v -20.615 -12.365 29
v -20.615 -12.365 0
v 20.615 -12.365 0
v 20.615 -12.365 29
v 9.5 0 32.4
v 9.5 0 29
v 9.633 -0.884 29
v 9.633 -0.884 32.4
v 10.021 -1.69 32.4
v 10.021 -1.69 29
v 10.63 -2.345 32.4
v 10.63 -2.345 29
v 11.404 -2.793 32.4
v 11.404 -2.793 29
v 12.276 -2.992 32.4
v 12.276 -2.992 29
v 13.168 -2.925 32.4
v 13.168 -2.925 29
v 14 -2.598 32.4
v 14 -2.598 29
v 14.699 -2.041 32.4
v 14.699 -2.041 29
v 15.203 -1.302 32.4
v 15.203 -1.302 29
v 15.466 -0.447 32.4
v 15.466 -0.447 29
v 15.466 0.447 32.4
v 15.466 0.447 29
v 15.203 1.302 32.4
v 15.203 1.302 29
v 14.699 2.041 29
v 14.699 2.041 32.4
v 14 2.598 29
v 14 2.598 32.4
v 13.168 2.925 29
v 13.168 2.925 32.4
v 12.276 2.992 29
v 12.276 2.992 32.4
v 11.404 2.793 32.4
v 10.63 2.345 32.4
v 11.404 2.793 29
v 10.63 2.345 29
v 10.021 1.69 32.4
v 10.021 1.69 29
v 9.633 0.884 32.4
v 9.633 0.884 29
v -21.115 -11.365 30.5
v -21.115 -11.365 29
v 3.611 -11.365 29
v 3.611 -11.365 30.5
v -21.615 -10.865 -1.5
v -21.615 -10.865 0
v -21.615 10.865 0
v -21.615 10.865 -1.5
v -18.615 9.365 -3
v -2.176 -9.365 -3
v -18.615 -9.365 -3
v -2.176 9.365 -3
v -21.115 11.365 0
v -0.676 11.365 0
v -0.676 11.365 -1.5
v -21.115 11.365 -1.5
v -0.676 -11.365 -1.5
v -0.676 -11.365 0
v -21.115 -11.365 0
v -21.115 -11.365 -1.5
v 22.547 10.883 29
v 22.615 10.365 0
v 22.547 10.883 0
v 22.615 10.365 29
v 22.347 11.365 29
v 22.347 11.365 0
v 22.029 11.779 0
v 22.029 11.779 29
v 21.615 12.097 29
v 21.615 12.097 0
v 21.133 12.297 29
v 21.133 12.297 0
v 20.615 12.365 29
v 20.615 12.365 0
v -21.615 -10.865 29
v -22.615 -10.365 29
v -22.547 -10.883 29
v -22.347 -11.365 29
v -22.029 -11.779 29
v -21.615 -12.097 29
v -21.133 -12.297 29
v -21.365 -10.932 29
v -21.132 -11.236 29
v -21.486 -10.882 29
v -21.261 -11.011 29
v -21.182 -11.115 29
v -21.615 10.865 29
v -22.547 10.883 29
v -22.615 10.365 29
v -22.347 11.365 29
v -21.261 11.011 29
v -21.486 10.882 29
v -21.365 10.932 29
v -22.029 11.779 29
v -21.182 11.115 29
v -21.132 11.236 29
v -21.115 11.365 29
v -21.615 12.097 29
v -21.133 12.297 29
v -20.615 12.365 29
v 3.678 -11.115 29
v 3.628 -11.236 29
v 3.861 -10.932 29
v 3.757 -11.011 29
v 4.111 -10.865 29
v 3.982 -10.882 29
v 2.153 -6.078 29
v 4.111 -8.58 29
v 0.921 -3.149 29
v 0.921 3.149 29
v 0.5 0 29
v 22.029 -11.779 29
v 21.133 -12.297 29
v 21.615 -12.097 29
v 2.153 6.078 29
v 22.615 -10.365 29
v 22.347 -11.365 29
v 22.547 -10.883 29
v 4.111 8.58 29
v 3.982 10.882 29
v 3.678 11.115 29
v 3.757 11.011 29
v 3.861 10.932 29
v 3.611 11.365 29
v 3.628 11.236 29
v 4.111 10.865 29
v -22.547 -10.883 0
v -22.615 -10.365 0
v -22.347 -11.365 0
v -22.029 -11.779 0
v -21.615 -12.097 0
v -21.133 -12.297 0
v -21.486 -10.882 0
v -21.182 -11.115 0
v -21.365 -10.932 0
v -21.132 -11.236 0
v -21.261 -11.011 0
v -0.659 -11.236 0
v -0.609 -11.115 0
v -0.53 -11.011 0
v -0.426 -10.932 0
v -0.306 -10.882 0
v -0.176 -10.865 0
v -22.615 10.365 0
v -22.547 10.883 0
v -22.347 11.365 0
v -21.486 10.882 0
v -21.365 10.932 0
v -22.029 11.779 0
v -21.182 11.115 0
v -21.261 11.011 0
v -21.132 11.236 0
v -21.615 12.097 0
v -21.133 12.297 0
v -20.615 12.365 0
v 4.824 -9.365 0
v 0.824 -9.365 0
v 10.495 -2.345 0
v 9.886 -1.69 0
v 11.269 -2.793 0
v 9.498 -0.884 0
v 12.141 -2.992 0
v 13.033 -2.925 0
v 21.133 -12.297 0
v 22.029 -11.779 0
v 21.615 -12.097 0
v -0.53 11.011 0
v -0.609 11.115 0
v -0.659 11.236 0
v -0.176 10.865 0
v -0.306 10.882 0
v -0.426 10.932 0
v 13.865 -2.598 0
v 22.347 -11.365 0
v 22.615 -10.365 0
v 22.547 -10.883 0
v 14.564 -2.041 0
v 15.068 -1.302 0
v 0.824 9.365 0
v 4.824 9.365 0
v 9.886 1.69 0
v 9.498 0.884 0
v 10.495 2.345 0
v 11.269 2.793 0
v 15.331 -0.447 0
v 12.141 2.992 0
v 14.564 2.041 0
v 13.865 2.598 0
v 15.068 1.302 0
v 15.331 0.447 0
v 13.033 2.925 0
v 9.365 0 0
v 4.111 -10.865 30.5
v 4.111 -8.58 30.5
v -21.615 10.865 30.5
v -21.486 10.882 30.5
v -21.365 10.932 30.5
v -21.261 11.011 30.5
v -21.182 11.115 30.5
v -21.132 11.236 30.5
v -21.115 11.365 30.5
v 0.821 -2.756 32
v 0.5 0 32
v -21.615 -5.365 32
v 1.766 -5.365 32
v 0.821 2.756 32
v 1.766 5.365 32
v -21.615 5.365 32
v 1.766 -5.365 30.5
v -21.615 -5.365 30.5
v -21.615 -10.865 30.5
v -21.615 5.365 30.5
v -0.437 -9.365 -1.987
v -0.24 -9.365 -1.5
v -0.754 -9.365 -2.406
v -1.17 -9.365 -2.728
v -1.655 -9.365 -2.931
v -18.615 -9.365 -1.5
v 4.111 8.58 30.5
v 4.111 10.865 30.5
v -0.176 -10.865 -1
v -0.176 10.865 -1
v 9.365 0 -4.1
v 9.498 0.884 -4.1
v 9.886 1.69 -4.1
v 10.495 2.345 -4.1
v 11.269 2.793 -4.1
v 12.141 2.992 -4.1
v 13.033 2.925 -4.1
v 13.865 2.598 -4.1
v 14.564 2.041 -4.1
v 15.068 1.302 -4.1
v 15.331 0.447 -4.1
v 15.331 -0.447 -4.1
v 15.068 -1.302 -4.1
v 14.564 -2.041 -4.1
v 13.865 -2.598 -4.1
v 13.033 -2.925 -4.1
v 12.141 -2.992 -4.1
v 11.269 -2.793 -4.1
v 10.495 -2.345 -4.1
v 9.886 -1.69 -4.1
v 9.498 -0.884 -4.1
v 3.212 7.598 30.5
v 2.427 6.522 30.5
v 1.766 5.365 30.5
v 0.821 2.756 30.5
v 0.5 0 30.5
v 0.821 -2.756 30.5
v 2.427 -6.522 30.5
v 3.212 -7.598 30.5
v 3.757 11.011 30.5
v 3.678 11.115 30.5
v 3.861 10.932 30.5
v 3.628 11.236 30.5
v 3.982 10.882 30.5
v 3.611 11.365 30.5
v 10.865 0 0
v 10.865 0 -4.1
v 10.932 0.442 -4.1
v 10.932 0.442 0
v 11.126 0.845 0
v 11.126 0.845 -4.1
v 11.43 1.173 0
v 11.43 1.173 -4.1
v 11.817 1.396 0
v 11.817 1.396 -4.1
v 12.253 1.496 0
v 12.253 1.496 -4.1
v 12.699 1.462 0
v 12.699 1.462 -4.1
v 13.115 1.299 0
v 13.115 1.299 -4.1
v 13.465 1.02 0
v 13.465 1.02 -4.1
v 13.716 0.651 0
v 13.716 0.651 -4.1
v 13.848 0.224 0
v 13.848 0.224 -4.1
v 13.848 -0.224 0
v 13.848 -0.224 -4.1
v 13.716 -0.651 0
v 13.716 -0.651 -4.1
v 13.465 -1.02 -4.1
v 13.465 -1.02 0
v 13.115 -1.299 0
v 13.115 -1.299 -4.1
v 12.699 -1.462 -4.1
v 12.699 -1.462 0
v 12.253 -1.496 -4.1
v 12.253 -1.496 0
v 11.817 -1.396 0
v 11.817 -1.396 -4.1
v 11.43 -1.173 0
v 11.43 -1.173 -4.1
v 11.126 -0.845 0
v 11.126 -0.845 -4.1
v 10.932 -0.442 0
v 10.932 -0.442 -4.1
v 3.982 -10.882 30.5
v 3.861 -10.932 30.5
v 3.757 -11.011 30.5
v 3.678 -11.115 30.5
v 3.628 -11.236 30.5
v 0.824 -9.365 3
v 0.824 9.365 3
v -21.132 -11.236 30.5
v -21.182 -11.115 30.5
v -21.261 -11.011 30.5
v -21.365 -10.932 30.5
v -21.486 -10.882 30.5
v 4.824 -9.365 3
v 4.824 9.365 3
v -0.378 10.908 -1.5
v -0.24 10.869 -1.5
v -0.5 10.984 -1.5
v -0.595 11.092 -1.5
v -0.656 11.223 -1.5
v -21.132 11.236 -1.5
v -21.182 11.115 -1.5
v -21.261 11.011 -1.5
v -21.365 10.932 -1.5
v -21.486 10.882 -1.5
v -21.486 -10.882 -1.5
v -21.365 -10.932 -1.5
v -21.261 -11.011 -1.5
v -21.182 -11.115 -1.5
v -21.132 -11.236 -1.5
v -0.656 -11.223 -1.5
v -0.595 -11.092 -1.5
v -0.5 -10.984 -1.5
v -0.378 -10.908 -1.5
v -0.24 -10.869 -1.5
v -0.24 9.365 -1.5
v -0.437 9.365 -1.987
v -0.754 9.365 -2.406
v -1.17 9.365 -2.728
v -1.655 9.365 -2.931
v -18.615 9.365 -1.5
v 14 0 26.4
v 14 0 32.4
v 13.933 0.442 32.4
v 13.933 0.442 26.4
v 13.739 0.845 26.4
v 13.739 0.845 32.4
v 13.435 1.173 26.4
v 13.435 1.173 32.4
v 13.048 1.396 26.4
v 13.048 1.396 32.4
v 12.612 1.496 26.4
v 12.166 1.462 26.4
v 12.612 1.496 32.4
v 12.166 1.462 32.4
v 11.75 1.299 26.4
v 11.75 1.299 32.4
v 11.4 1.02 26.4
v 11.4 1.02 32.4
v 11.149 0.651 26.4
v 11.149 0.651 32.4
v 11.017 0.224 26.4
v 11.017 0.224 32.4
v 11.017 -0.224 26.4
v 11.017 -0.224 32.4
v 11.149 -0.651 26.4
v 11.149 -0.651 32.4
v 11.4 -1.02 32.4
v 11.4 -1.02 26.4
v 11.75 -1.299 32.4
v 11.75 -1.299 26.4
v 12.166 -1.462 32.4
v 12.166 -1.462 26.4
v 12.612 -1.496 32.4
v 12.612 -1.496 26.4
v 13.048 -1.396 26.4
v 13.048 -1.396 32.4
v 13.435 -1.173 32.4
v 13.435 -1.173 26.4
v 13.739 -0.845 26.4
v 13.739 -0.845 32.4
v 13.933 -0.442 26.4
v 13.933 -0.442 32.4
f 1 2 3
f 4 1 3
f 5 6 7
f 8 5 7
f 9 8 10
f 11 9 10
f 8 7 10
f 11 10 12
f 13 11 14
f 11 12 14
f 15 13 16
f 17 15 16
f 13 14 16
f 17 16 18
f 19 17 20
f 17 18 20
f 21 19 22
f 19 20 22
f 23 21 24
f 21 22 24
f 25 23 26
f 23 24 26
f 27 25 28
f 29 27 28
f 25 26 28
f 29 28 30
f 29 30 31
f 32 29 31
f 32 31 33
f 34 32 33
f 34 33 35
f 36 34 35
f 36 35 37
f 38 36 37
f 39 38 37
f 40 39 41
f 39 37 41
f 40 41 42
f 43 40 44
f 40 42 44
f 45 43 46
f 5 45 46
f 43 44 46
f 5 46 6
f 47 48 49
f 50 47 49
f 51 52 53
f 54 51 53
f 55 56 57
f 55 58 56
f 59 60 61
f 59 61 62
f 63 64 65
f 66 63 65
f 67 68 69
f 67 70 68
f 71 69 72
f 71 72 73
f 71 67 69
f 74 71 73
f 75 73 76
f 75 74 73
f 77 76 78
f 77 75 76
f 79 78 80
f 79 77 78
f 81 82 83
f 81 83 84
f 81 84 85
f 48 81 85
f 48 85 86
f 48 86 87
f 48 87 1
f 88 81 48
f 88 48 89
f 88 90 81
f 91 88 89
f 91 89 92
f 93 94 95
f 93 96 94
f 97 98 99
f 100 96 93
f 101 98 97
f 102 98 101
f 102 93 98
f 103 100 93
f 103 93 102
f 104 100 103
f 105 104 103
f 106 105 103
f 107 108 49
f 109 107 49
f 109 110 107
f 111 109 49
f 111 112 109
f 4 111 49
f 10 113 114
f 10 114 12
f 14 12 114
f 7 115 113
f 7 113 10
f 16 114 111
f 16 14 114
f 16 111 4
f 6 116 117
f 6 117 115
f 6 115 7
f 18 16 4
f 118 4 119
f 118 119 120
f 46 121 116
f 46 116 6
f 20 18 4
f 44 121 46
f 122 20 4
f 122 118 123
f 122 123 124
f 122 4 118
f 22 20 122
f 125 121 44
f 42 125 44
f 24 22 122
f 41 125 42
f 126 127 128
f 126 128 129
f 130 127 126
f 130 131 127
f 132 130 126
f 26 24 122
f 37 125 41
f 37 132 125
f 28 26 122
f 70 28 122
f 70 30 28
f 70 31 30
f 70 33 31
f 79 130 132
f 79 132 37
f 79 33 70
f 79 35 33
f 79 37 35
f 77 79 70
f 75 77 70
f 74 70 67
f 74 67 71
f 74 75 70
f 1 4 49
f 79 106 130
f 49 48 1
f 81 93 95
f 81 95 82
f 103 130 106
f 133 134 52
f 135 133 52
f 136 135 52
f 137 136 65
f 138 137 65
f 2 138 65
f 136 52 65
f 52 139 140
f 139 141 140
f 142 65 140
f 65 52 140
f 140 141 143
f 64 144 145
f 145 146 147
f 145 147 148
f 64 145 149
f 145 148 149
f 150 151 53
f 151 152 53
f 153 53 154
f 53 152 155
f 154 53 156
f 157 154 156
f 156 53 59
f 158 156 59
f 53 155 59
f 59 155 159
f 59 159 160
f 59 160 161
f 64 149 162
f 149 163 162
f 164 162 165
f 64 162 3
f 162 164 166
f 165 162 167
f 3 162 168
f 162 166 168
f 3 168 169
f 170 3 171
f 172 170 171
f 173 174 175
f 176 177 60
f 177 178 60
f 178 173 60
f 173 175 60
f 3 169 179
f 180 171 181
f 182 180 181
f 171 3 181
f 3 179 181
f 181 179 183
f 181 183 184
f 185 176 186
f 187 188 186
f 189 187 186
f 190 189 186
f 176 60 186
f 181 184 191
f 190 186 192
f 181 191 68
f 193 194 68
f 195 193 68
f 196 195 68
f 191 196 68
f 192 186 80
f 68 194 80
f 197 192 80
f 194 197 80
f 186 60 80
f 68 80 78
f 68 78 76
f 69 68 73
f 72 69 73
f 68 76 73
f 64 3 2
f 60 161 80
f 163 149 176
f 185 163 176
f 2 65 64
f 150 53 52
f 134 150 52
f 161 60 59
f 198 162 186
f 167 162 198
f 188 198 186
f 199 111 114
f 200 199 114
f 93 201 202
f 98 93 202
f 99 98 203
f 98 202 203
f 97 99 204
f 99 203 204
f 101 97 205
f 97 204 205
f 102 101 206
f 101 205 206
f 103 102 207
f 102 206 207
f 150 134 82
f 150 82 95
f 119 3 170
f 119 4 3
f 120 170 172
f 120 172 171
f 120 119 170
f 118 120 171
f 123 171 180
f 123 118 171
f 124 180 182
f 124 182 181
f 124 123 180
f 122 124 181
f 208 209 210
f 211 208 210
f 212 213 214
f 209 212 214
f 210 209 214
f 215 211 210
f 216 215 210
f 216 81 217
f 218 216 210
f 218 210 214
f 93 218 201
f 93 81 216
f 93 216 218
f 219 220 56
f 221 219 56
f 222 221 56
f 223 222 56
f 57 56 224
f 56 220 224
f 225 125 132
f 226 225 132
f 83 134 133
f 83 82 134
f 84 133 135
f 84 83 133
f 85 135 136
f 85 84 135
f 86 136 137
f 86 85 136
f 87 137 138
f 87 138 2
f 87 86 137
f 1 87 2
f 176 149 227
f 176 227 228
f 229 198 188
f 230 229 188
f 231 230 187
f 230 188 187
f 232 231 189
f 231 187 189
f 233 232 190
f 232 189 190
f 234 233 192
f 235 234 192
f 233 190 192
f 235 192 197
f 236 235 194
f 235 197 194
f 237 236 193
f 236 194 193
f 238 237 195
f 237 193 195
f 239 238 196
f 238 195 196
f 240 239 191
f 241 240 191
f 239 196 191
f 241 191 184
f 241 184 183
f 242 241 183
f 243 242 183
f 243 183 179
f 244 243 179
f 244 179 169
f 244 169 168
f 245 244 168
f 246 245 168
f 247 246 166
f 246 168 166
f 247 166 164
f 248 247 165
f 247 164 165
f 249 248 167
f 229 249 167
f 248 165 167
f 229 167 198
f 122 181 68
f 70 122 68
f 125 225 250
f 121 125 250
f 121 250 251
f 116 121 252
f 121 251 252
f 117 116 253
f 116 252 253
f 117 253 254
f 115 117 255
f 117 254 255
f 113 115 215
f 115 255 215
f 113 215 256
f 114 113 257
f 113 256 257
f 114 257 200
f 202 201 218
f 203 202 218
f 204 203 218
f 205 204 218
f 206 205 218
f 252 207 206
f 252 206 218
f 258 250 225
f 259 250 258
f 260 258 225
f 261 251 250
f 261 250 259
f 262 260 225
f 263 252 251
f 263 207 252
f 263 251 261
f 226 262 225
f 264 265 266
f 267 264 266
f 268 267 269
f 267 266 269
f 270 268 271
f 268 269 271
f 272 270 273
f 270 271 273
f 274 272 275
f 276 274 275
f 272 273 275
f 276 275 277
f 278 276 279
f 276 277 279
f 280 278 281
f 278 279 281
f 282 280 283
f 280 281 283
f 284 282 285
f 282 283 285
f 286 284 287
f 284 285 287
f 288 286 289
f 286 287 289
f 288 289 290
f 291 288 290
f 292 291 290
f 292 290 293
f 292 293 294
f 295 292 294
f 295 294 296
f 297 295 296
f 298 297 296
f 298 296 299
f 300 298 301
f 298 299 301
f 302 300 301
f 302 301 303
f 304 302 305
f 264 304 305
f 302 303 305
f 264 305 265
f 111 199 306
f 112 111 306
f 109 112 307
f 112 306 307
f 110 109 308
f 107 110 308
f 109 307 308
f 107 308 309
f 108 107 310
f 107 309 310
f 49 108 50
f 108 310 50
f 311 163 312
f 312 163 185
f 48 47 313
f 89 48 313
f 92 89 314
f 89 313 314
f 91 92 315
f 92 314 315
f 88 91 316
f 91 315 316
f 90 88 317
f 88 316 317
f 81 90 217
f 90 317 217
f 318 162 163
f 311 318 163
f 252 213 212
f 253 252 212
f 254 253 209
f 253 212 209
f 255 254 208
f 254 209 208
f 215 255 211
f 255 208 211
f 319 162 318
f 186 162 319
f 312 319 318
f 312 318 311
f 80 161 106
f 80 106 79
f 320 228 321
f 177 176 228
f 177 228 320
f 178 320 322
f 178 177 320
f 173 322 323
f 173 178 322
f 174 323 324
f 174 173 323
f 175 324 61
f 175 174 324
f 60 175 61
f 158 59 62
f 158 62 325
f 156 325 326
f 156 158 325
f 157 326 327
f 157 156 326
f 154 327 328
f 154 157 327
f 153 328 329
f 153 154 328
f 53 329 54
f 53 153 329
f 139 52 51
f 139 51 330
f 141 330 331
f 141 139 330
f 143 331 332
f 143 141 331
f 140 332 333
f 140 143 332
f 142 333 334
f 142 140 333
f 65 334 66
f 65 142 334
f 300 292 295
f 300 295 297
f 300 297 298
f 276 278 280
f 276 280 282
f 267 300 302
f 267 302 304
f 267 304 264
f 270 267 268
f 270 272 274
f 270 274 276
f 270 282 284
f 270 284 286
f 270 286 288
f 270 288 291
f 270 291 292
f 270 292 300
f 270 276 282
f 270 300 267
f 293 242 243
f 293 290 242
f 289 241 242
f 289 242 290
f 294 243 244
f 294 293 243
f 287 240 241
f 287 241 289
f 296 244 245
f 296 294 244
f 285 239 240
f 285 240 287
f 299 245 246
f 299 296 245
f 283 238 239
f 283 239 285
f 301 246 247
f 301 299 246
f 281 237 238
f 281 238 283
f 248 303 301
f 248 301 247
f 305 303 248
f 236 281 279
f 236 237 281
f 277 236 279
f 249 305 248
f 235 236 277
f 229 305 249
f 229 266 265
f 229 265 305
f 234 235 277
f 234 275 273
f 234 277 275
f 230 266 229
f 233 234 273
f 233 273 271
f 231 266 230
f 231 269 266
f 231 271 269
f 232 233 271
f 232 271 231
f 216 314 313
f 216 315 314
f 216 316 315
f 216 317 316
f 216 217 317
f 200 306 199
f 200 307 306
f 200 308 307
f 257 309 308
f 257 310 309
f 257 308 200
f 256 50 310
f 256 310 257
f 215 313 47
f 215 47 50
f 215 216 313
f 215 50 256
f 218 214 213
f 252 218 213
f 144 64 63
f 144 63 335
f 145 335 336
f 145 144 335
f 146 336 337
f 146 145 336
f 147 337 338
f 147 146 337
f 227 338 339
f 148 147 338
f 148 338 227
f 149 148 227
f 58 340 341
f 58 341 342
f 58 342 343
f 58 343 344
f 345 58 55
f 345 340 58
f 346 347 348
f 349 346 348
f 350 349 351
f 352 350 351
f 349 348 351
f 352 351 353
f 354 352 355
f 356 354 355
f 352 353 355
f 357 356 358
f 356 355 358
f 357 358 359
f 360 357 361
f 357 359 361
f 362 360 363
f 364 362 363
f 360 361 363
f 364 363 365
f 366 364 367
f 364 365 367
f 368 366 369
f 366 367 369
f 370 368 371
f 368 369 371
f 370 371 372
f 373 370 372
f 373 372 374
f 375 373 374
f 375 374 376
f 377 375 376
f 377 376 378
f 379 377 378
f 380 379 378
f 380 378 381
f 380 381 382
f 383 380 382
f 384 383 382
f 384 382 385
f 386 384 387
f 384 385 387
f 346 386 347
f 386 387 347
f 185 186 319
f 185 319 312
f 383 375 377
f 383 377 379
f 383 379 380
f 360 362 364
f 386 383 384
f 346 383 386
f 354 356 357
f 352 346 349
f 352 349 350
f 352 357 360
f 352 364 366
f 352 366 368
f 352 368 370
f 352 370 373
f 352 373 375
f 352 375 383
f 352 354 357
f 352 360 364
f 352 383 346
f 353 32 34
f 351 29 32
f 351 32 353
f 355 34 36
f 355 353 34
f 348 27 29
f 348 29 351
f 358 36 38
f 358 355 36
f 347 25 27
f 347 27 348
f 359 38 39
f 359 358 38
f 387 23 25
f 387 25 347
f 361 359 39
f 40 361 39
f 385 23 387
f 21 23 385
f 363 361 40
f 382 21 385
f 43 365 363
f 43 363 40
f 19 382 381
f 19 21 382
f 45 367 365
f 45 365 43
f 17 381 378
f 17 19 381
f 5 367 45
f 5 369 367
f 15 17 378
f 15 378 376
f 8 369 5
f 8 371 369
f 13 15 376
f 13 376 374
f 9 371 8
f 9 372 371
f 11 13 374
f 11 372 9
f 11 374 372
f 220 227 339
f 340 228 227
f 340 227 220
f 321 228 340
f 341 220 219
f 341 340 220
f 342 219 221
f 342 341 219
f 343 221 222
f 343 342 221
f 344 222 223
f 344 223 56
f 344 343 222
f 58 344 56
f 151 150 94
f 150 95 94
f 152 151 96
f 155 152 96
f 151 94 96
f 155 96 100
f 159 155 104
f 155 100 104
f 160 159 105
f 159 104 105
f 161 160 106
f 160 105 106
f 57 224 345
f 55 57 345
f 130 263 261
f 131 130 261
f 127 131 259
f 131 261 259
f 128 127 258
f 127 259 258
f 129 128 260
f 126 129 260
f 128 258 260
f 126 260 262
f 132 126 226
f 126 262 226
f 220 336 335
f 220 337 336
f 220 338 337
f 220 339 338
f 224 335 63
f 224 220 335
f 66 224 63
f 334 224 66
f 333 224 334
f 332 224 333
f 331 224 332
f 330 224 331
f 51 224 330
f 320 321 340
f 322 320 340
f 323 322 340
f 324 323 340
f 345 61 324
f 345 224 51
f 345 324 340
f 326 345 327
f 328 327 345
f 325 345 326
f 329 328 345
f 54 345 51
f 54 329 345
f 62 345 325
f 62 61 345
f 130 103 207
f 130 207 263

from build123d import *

# Parameters (mm, degrees)
SKETCH_1_W          = 45.23
SKETCH_1_H          = 24.73
EXTRUDE_1_DEPTH     = 29
FILLET_1_R          = 2
SKETCH_2_R          = 3
EXTRUDE_2_DEPTH     = 3.4
SKETCH_3_R          = 1.5
CUT_EXTRUDE_1_DEPTH = 6
SKETCH_4_W          = 25.725975672
SKETCH_4_H          = 22.73
EXTRUDE_3_DEPTH     = 1.5
SKETCH_5_R          = 0.5
CUT_EXTRUDE_2_DEPTH = 1.5
CUT_EXTRUDE_3_DEPTH = 1.5
EXTRUDE_START       = 1.5
EXTRUDE_4_DEPTH     = 1.5
SKETCH_21_W         = 21.4387918
SKETCH_21_H         = 22.73
EXTRUDE_11_DEPTH    = 1.5
CUT_EXTRUDE_START   = -1.5
SKETCH_23_R         = 0.5
CUT_EXTRUDE_4_DEPTH = 1.5
SKETCH_24_W         = 18.4387918
SKETCH_24_H         = 18.73
EXTRUDE_12_DEPTH    = 1.5
FILLET_2_R          = 2
SKETCH_25_R         = 3
EXTRUDE_13_DEPTH    = 4.1
SKETCH_26_R         = 1.5
CUT_EXTRUDE_5_DEPTH = 4.1
SKETCH_27_W         = 4
SKETCH_27_H         = 18.73
CUT_EXTRUDE_6_DEPTH = 3


with BuildPart() as part:
    # 草图1 → 凸台-拉伸1 (new body)
    with BuildSketch(Plane.XY):
        Rectangle(SKETCH_1_W, SKETCH_1_H)
    extrude(amount=EXTRUDE_1_DEPTH)

    # 圆角1
    fillet_1_edges = [part.edges().sort_by_distance(p)[0] for p in [
        (22.615, -12.365, 14.5),
        (-22.615, -12.365, 14.5),
        (-22.615, 12.365, 14.5),
        (22.615, 12.365, 14.5),
    ]]
    fillet(fillet_1_edges, radius=FILLET_1_R)

    # 草图2 → 凸台-拉伸2 (add)
    with BuildSketch(Plane.XY.offset(29)):
        with Locations(Location((12.5, 0, 0), (0, 0, 180))):
            Circle(SKETCH_2_R)
    extrude(amount=EXTRUDE_2_DEPTH)

    # 草图3 → 切除-拉伸1 (cut)
    with BuildSketch(Plane.XY.offset(32.4)):
        with Locations((12.5, 0)):
            Circle(SKETCH_3_R)
    extrude(amount=-CUT_EXTRUDE_1_DEPTH, mode=Mode.SUBTRACT)

    # 草图4 → 凸台-拉伸3 (add)
    with BuildSketch(Plane.XY.offset(29)):
        with Locations((-8.752012164, 0)):
            Rectangle(SKETCH_4_W, SKETCH_4_H)
    extrude(amount=EXTRUDE_3_DEPTH)

    # 草图5 → 切除-拉伸2 (cut)
    with BuildSketch(Plane.XY.offset(30.5)):
        with Locations((-21.615, 11.365)):
            Circle(SKETCH_5_R)
        with Locations((4.110975672, 11.365)):
            Circle(SKETCH_5_R)
        with Locations((-21.615, -11.365)):
            Circle(SKETCH_5_R)
        with Locations((4.110975672, -11.365)):
            Circle(SKETCH_5_R)
    extrude(amount=-CUT_EXTRUDE_2_DEPTH, mode=Mode.SUBTRACT)

    # 草图6 → 切除-拉伸3 (cut)
    with BuildSketch(Plane.XY.offset(30.5)):
        with BuildLine():
            Line((4.110975672, -8.580458661), (4.110975672, 8.580458661))
            ThreePointArc((4.110975672, 8.580458661), (0.5, 0), (4.110975672, -8.580458661))
        make_face()
    extrude(amount=-CUT_EXTRUDE_3_DEPTH, mode=Mode.SUBTRACT)

    # 草图7 → 凸台-拉伸4 (add)
    with BuildSketch(Plane.XY.offset(30.5).offset(EXTRUDE_START)):
        with BuildLine():
            Line((-21.615, 5.365), (1.766092277, 5.365))
            ThreePointArc((1.766092277, 5.365), (0.5, 0), (1.766092277, -5.365))
            Line((1.766092277, -5.365), (-21.615, -5.365))
            Line((-21.615, -5.365), (-21.615, 5.365))
        make_face()
    extrude(amount=-EXTRUDE_4_DEPTH)

    # 草图21 → 凸台-拉伸11 (add)
    with BuildSketch(Plane(origin=(-20.629587366, 0.959657155, 0), x_dir=(-1, 0, 0), z_dir=(0, 0, -1))):
        with Locations((-9.733983266, -0.959657155)):
            Rectangle(SKETCH_21_W, SKETCH_21_H)
    extrude(amount=EXTRUDE_11_DEPTH)

    # 草图23 → 切除-拉伸4 (cut)
    with BuildSketch(Plane(origin=(-20.629587366, 0.959657155, -1.5), x_dir=(-1, 0, 0), z_dir=(0, 0, -1)).offset(CUT_EXTRUDE_START)):
        with Locations((-20.453379166, 10.405342845)):
            Circle(SKETCH_23_R)
        with Locations((0.985412634, 10.405342845)):
            Circle(SKETCH_23_R)
        with Locations((-20.453379166, -12.324657155)):
            Circle(SKETCH_23_R)
        with Locations((0.985412634, -12.324657155)):
            Circle(SKETCH_23_R)
    extrude(amount=CUT_EXTRUDE_4_DEPTH, mode=Mode.SUBTRACT)

    # 草图24 → 凸台-拉伸12 (add)
    with BuildSketch(Plane(origin=(0, 0, -1.5), x_dir=(-1, 0, 0), z_dir=(0, 0, -1))):
        with Locations((9.3956041, 0)):
            Rectangle(SKETCH_24_W, SKETCH_24_H)
    extrude(amount=EXTRUDE_12_DEPTH)

    # 圆角2
    fillet_2_edges = [part.edges().sort_by_distance(p)[0] for p in [
        (-0.1762082, 0, -3),
    ]]
    fillet(fillet_2_edges, radius=FILLET_2_R)

    # 草图25 → 凸台-拉伸13 (add)
    with BuildSketch(Plane(origin=(0, 0, 0), x_dir=(-1, 0, 0), z_dir=(0, 0, -1))):
        with Locations((-12.365, 0)):
            Circle(SKETCH_25_R)
    extrude(amount=EXTRUDE_13_DEPTH)

    # 草图26 → 切除-拉伸5 (cut)
    with BuildSketch(Plane(origin=(0, 0, -4.1), x_dir=(-1, 0, 0), z_dir=(0, 0, -1))):
        with Locations((-12.365, 0)):
            Circle(SKETCH_26_R)
    extrude(amount=-CUT_EXTRUDE_5_DEPTH, mode=Mode.SUBTRACT)

    # 草图27 → 切除-拉伸6 (cut)
    with BuildSketch(Plane(origin=(0, 0, 0), x_dir=(-1, 0, 0), z_dir=(0, 0, -1))):
        with Locations((-2.8237918, 0)):
            Rectangle(SKETCH_27_W, SKETCH_27_H)
    extrude(amount=-CUT_EXTRUDE_6_DEPTH, mode=Mode.SUBTRACT)


solid = part.part
